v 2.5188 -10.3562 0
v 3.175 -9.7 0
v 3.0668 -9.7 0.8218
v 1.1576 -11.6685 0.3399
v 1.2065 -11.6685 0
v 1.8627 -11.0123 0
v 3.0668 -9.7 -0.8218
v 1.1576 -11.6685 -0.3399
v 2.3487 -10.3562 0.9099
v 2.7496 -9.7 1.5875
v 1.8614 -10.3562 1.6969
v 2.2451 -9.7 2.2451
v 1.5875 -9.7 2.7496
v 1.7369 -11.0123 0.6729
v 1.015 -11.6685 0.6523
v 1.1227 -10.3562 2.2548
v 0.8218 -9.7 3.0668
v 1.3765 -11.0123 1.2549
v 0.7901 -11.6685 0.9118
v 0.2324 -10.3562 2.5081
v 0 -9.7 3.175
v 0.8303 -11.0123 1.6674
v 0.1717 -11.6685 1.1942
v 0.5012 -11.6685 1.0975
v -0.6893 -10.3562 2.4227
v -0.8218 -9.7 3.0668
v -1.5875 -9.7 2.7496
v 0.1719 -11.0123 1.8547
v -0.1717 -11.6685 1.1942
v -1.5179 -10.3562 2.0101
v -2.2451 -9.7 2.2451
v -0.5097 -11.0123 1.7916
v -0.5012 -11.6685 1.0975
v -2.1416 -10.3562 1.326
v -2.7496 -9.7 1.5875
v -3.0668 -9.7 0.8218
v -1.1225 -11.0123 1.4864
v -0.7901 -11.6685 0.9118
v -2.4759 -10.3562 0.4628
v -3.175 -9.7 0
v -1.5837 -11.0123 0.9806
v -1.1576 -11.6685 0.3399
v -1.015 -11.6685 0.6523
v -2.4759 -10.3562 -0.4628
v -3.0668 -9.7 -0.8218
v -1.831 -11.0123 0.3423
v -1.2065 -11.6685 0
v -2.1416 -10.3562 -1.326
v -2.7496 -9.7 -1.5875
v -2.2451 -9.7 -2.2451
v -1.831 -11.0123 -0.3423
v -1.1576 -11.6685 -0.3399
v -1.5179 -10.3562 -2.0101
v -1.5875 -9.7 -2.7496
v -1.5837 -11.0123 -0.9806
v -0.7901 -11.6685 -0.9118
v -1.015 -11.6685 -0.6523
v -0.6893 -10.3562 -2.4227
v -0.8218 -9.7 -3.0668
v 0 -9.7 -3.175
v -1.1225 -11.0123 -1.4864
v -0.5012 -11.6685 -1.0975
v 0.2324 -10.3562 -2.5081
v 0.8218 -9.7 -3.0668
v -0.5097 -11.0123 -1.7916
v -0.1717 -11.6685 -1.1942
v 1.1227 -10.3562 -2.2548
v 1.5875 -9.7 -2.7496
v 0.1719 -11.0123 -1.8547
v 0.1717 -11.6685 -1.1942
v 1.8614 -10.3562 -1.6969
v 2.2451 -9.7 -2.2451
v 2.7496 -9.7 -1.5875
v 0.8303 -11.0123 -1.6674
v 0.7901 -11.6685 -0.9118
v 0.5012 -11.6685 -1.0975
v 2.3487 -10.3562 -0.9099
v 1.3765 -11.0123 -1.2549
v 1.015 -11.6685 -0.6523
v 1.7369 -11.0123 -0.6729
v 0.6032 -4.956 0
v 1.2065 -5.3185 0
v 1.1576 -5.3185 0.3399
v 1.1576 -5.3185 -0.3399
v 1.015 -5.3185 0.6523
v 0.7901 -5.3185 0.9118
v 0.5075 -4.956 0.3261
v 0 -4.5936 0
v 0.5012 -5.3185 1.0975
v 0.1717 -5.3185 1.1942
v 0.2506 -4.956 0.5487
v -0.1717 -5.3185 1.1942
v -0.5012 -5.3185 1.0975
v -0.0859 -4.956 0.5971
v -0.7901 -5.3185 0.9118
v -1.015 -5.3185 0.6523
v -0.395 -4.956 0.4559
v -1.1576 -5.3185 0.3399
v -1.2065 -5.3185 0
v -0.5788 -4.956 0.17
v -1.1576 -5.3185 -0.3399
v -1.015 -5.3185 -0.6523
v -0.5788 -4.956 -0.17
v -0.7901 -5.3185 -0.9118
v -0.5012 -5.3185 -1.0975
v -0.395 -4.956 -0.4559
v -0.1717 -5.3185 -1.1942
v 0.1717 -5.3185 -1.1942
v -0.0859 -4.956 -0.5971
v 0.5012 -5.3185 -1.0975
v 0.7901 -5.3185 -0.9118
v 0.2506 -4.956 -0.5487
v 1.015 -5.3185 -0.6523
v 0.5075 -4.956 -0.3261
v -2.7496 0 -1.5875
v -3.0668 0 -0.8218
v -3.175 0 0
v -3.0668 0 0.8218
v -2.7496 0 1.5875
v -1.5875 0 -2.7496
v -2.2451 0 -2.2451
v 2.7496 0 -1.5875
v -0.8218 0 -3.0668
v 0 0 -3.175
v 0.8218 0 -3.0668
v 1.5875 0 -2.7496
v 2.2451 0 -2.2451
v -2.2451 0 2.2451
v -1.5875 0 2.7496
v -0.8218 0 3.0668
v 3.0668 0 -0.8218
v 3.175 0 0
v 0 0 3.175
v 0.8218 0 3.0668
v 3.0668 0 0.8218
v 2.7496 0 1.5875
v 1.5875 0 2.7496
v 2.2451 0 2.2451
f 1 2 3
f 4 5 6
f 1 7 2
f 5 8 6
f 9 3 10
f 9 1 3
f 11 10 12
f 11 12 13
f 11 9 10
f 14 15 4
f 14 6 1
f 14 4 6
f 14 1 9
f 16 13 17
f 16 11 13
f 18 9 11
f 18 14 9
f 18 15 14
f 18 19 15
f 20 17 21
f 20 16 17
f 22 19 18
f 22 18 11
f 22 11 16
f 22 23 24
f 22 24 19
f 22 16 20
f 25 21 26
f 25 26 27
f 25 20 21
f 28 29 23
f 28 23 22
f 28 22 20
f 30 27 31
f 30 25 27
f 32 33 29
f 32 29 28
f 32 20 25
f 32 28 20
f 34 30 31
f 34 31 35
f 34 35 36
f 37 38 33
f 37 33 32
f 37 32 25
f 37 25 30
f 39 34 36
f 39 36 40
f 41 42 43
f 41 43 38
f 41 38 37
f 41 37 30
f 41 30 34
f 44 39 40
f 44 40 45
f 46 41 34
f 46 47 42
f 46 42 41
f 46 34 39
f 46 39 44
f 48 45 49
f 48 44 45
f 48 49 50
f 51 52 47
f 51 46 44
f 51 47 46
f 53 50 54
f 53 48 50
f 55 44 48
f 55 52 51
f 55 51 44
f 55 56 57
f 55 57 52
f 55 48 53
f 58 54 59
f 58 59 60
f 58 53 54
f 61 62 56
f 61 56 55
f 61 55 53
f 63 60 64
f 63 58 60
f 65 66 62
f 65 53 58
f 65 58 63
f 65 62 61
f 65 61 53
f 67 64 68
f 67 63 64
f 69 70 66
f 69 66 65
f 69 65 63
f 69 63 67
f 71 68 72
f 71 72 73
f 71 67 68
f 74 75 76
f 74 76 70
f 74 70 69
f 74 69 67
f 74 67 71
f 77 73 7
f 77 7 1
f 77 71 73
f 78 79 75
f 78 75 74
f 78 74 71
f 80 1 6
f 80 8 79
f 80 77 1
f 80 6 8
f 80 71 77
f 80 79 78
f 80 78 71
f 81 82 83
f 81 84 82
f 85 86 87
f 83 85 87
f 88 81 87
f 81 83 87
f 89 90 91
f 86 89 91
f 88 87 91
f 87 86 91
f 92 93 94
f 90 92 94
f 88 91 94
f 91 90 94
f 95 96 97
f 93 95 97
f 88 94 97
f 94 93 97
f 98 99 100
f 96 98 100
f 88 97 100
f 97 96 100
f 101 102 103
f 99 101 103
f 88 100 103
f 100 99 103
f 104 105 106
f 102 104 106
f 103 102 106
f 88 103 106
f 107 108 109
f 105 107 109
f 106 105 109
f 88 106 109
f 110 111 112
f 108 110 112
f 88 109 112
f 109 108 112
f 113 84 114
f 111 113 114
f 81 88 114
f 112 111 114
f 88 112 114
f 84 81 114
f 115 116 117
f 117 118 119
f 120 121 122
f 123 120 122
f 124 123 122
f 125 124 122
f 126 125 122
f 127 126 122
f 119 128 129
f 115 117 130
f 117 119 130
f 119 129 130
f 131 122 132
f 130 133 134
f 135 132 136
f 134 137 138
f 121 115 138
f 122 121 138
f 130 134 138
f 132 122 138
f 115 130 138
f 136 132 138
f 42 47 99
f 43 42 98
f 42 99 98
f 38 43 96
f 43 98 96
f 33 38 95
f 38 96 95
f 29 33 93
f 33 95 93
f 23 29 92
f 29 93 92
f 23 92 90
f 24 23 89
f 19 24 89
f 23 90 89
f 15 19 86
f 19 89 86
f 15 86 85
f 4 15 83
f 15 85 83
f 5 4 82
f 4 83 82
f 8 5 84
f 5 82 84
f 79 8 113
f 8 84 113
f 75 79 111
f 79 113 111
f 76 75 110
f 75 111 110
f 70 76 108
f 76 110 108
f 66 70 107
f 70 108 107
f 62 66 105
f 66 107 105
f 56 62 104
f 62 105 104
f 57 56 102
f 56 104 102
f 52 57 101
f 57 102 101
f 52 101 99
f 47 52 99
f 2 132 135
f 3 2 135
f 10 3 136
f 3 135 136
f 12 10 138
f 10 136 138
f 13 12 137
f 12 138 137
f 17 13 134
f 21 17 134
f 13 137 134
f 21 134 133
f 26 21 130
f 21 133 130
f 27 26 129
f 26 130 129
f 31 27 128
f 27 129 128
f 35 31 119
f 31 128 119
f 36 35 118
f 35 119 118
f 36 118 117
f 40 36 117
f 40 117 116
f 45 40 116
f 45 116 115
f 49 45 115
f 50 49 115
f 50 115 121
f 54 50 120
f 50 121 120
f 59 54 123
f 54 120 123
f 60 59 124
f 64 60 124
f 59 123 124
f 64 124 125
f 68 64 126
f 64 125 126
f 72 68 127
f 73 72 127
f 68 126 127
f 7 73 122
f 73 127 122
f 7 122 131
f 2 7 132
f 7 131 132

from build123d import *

# Parameters (mm, degrees)
F0_R     = 3.175
F1_DEPTH = 12.7
F2_SIZE  = 3
F4_D     = 2.413
F4_DEPTH = 6.35
F4_START = 1.0315
F4_TIP   = 0.7249383369


with BuildPart() as f1:
    # F0 (on Front) → F1 (new body)
    with BuildSketch(Plane.XZ):
        Circle(F0_R)
    extrude(amount=F1_DEPTH)

    # F2
    f2_edges = [f1.edges().sort_by_distance(p)[0] for p in [
        (-3.175, -12.7, 0),
    ]]
    chamfer(f2_edges, length=F2_SIZE)

    # F4
    # its depths count from where the whole tool has entered the part; down to there all is cleared
    with Locations(Plane.XZ.offset(12.7).offset(-F4_START)):
        with Locations((0, 0)):
            Hole(F4_D / 2, depth=F4_DEPTH)
            with Locations((0, 0, -(F4_DEPTH + F4_TIP / 2))):  # 118° drill point
                Cone(0, F4_D / 2, F4_TIP, mode=Mode.SUBTRACT)


solid = f1.part
